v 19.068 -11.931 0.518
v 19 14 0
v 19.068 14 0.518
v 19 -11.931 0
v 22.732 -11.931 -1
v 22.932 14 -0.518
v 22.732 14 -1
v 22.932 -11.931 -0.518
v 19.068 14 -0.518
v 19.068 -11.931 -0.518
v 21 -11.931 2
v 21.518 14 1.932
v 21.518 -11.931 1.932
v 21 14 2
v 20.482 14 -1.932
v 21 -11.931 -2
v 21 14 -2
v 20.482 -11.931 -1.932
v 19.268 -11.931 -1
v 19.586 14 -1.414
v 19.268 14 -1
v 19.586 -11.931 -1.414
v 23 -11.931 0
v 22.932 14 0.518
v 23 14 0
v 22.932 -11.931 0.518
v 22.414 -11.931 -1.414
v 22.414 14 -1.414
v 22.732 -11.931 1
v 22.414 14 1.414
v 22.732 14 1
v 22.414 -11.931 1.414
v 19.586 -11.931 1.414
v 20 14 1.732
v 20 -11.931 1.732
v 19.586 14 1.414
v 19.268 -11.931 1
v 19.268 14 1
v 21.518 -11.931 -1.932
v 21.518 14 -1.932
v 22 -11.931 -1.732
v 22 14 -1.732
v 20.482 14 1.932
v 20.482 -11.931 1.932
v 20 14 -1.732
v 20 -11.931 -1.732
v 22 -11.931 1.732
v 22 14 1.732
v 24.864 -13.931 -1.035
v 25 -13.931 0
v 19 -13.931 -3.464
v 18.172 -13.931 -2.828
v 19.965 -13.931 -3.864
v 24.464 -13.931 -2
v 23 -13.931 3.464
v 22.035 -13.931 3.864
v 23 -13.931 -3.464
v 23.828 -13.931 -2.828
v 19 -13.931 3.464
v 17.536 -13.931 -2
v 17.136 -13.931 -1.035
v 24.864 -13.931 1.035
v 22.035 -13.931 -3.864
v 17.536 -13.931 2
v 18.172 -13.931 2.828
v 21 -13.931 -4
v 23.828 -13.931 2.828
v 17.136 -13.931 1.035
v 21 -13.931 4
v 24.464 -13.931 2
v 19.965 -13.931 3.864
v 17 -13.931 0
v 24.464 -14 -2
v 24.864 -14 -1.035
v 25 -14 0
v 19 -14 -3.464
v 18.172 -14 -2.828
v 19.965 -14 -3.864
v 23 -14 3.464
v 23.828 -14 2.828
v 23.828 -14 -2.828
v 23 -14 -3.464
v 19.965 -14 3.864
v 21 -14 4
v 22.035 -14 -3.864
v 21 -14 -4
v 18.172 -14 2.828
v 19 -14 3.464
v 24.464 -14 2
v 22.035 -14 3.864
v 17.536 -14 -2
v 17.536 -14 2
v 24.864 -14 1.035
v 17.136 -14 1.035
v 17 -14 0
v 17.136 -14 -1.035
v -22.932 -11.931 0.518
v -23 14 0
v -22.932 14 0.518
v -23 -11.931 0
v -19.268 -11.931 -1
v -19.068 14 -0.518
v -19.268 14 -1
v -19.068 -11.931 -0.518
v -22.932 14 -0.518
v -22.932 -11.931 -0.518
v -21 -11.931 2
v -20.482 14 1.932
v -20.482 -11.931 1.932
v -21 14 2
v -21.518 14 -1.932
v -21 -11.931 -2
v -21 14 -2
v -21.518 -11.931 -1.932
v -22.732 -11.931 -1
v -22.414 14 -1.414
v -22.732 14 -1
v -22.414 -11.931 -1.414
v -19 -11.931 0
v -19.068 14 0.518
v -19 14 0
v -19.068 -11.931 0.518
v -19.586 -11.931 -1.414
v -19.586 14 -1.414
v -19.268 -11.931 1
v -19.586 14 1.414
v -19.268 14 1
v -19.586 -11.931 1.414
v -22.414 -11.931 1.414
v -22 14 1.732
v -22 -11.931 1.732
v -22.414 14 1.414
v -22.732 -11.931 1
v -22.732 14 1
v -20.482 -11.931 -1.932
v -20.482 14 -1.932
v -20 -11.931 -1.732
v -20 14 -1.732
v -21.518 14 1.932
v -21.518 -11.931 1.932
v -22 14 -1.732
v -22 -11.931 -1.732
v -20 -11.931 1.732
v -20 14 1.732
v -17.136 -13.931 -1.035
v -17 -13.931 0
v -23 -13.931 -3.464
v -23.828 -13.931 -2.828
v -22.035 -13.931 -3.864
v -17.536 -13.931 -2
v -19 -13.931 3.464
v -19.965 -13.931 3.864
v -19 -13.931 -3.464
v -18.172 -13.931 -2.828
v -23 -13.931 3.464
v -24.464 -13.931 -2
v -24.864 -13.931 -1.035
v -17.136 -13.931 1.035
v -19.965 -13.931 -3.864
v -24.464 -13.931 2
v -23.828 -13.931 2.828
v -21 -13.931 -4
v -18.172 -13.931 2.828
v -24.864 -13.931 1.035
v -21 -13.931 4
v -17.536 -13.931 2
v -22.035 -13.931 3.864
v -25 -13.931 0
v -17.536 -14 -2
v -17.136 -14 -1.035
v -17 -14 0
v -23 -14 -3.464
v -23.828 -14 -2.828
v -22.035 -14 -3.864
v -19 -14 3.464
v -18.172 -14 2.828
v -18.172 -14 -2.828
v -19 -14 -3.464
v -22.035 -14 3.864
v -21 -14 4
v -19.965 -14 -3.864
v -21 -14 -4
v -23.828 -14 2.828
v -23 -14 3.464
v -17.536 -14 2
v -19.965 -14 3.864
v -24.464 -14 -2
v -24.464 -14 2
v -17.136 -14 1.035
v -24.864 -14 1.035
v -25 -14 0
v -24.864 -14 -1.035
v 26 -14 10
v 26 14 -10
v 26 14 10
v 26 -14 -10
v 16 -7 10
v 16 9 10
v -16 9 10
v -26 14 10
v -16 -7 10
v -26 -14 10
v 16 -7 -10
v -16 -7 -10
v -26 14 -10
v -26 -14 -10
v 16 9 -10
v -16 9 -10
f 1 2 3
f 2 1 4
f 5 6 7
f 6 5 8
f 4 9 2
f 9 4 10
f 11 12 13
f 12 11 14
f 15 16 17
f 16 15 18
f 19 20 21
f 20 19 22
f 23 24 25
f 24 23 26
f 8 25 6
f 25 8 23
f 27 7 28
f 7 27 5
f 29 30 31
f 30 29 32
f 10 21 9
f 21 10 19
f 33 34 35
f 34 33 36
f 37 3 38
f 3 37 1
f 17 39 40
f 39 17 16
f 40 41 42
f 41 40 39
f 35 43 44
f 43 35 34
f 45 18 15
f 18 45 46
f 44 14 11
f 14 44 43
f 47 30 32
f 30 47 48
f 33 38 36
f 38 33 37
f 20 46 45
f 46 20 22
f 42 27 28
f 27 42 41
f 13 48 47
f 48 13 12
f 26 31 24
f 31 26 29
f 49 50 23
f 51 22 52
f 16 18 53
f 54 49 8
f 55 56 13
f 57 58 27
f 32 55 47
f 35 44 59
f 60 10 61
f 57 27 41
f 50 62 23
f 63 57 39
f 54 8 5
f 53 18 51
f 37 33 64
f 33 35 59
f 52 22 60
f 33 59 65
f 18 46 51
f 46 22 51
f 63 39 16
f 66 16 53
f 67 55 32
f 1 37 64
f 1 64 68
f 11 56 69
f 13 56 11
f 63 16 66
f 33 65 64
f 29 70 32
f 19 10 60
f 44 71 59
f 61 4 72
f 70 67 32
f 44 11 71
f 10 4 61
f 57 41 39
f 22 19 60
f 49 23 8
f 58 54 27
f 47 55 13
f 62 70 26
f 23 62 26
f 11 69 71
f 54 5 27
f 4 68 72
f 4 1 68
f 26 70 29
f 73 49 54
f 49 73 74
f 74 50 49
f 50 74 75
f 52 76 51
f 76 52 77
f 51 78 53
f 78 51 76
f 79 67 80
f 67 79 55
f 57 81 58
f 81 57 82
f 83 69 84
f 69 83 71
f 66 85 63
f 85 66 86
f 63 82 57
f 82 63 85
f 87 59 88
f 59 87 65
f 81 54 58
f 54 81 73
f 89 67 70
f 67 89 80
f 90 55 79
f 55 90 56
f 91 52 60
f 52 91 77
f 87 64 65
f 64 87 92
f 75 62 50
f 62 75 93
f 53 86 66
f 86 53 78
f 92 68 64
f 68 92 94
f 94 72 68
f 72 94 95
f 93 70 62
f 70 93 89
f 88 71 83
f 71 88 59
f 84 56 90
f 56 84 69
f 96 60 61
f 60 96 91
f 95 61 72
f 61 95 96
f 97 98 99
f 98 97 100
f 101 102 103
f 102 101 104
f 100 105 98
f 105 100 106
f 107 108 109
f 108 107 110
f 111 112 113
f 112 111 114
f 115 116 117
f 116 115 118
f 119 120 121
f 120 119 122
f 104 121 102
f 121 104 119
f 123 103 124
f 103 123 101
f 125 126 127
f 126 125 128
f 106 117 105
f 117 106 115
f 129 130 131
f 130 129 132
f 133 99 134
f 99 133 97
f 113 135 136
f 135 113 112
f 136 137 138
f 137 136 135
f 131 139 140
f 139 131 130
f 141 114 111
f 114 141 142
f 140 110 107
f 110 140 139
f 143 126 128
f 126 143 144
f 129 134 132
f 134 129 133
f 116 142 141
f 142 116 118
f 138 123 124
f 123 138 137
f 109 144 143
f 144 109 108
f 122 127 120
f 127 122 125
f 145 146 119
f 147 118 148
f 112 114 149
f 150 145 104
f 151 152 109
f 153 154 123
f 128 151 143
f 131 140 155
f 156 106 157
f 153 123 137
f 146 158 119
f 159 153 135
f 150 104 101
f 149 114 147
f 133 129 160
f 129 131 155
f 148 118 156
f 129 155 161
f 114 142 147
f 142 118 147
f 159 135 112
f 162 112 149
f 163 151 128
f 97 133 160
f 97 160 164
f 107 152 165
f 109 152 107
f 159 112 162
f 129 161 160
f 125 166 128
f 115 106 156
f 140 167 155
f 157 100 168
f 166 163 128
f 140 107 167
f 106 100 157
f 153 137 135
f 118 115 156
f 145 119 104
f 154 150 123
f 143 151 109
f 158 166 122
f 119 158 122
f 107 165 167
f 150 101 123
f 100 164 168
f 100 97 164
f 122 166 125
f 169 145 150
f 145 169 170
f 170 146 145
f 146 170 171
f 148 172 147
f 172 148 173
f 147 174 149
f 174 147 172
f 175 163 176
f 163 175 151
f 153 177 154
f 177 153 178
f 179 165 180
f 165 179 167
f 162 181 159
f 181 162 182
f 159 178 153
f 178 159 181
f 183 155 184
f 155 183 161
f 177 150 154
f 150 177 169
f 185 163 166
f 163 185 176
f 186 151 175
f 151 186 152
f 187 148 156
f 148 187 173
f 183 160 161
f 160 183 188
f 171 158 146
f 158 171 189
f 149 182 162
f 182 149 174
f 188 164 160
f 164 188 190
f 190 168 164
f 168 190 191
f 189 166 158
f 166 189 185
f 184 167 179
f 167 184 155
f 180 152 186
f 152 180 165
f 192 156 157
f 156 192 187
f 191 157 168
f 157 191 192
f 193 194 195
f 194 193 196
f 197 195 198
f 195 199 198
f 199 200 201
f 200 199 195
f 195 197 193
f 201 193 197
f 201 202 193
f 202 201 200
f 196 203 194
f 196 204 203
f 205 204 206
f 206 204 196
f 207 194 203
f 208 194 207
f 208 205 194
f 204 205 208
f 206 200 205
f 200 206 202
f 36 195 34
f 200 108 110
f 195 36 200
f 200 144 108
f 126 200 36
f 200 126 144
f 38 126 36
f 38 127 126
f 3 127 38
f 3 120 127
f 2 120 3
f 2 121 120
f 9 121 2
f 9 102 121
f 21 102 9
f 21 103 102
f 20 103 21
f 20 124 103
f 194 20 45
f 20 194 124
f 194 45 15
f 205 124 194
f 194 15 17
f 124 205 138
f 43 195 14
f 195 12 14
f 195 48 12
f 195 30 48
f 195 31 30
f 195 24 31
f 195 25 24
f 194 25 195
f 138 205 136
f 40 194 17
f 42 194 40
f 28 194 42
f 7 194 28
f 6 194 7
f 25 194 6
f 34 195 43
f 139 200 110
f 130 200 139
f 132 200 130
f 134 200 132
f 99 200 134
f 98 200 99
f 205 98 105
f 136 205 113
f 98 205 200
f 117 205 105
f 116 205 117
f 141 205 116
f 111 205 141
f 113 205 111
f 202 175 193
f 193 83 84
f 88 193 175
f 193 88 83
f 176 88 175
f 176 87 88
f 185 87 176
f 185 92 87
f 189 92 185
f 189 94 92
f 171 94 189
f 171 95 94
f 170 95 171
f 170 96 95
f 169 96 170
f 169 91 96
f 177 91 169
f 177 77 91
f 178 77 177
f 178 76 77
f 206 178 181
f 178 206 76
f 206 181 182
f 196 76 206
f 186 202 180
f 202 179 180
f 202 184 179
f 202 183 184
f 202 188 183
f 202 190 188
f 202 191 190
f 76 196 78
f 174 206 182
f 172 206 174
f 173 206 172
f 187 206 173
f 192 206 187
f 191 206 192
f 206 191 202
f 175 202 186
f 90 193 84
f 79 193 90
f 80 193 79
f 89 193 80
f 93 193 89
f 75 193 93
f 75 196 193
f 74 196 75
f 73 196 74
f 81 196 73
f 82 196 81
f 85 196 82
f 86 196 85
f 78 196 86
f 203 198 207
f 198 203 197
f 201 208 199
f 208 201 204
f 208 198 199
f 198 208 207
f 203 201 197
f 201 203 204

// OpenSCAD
// Wire strippers (second type) holder 3D Design

// Copyright (c) 2014 by Jeremy Bennett <jeremy.bennett@embecosm.com>

// Crimp holder 3D Design is licensed under a Creative Commons
// Attribution-ShareAlike 3.0 Unported License.

// You should have received a copy of the license along with this work.  If not,
// see <http://creativecommons.org/licenses/by-sa/3.0/>.

// -----------------------------------------------------------------------------


use <MCAD/regular_shapes.scad>


// A screw hole with a countersink
module screwhole (bore, length) {
	iota = length / 100;
	half_length = length / 2 + iota;
	full_length = half_length * 2;
	union () {
		cylinder (r = bore / 2, h = full_length, center = true, $fn = 24);
		translate (v = [0, 0, -half_length + bore / 4 + bore / 10])
			cylinder (r1 = bore, r2 = bore / 2, h = bore / 2, center = true, $fn = 24);
		translate (v = [0, 0, -half_length + bore / 20])
			cylinder (r = bore, h = bore / 10, center = true, $fn = 24);
	}
}


// A screw hole for a screw parallel with the Y axis
module screwhole_y (bore, length, x_off, z_off) {
	translate (v = [x_off, 0, z_off])
		rotate (a = [-90, 0, 0])
			screwhole (bore = bore, length = length);
}


// Crimp support with screwholes
module stripper_support () {
	back_thickness = 7;
	front_thickness = 5;
	side_thickness = 10;
	hole_width = 32;
	hole_depth = 16;
	block_width = hole_width + side_thickness * 2;
	block_depth = hole_depth + back_thickness + front_thickness;
	height = 20;
	screw_x_off = (hole_width + side_thickness) / 2;
	screw_z_off = 0;
	iota = 0.1;
	difference () {
		cube (size = [block_width, block_depth, height], center = true);
		// hole for strippers
		translate (v = [0, (back_thickness - front_thickness) / 2, 0])
			cube (size = [ hole_width, hole_depth, height + iota], center = true);
		// screw_holes
		screwhole_y (bore = 4, length = block_depth + iota, x_off =  screw_x_off,
		             z_off = screw_z_off);
		screwhole_y (bore = 4, length = block_depth + iota, x_off = -screw_x_off,
		             z_off = screw_z_off);
	}
}


stripper_support ();
